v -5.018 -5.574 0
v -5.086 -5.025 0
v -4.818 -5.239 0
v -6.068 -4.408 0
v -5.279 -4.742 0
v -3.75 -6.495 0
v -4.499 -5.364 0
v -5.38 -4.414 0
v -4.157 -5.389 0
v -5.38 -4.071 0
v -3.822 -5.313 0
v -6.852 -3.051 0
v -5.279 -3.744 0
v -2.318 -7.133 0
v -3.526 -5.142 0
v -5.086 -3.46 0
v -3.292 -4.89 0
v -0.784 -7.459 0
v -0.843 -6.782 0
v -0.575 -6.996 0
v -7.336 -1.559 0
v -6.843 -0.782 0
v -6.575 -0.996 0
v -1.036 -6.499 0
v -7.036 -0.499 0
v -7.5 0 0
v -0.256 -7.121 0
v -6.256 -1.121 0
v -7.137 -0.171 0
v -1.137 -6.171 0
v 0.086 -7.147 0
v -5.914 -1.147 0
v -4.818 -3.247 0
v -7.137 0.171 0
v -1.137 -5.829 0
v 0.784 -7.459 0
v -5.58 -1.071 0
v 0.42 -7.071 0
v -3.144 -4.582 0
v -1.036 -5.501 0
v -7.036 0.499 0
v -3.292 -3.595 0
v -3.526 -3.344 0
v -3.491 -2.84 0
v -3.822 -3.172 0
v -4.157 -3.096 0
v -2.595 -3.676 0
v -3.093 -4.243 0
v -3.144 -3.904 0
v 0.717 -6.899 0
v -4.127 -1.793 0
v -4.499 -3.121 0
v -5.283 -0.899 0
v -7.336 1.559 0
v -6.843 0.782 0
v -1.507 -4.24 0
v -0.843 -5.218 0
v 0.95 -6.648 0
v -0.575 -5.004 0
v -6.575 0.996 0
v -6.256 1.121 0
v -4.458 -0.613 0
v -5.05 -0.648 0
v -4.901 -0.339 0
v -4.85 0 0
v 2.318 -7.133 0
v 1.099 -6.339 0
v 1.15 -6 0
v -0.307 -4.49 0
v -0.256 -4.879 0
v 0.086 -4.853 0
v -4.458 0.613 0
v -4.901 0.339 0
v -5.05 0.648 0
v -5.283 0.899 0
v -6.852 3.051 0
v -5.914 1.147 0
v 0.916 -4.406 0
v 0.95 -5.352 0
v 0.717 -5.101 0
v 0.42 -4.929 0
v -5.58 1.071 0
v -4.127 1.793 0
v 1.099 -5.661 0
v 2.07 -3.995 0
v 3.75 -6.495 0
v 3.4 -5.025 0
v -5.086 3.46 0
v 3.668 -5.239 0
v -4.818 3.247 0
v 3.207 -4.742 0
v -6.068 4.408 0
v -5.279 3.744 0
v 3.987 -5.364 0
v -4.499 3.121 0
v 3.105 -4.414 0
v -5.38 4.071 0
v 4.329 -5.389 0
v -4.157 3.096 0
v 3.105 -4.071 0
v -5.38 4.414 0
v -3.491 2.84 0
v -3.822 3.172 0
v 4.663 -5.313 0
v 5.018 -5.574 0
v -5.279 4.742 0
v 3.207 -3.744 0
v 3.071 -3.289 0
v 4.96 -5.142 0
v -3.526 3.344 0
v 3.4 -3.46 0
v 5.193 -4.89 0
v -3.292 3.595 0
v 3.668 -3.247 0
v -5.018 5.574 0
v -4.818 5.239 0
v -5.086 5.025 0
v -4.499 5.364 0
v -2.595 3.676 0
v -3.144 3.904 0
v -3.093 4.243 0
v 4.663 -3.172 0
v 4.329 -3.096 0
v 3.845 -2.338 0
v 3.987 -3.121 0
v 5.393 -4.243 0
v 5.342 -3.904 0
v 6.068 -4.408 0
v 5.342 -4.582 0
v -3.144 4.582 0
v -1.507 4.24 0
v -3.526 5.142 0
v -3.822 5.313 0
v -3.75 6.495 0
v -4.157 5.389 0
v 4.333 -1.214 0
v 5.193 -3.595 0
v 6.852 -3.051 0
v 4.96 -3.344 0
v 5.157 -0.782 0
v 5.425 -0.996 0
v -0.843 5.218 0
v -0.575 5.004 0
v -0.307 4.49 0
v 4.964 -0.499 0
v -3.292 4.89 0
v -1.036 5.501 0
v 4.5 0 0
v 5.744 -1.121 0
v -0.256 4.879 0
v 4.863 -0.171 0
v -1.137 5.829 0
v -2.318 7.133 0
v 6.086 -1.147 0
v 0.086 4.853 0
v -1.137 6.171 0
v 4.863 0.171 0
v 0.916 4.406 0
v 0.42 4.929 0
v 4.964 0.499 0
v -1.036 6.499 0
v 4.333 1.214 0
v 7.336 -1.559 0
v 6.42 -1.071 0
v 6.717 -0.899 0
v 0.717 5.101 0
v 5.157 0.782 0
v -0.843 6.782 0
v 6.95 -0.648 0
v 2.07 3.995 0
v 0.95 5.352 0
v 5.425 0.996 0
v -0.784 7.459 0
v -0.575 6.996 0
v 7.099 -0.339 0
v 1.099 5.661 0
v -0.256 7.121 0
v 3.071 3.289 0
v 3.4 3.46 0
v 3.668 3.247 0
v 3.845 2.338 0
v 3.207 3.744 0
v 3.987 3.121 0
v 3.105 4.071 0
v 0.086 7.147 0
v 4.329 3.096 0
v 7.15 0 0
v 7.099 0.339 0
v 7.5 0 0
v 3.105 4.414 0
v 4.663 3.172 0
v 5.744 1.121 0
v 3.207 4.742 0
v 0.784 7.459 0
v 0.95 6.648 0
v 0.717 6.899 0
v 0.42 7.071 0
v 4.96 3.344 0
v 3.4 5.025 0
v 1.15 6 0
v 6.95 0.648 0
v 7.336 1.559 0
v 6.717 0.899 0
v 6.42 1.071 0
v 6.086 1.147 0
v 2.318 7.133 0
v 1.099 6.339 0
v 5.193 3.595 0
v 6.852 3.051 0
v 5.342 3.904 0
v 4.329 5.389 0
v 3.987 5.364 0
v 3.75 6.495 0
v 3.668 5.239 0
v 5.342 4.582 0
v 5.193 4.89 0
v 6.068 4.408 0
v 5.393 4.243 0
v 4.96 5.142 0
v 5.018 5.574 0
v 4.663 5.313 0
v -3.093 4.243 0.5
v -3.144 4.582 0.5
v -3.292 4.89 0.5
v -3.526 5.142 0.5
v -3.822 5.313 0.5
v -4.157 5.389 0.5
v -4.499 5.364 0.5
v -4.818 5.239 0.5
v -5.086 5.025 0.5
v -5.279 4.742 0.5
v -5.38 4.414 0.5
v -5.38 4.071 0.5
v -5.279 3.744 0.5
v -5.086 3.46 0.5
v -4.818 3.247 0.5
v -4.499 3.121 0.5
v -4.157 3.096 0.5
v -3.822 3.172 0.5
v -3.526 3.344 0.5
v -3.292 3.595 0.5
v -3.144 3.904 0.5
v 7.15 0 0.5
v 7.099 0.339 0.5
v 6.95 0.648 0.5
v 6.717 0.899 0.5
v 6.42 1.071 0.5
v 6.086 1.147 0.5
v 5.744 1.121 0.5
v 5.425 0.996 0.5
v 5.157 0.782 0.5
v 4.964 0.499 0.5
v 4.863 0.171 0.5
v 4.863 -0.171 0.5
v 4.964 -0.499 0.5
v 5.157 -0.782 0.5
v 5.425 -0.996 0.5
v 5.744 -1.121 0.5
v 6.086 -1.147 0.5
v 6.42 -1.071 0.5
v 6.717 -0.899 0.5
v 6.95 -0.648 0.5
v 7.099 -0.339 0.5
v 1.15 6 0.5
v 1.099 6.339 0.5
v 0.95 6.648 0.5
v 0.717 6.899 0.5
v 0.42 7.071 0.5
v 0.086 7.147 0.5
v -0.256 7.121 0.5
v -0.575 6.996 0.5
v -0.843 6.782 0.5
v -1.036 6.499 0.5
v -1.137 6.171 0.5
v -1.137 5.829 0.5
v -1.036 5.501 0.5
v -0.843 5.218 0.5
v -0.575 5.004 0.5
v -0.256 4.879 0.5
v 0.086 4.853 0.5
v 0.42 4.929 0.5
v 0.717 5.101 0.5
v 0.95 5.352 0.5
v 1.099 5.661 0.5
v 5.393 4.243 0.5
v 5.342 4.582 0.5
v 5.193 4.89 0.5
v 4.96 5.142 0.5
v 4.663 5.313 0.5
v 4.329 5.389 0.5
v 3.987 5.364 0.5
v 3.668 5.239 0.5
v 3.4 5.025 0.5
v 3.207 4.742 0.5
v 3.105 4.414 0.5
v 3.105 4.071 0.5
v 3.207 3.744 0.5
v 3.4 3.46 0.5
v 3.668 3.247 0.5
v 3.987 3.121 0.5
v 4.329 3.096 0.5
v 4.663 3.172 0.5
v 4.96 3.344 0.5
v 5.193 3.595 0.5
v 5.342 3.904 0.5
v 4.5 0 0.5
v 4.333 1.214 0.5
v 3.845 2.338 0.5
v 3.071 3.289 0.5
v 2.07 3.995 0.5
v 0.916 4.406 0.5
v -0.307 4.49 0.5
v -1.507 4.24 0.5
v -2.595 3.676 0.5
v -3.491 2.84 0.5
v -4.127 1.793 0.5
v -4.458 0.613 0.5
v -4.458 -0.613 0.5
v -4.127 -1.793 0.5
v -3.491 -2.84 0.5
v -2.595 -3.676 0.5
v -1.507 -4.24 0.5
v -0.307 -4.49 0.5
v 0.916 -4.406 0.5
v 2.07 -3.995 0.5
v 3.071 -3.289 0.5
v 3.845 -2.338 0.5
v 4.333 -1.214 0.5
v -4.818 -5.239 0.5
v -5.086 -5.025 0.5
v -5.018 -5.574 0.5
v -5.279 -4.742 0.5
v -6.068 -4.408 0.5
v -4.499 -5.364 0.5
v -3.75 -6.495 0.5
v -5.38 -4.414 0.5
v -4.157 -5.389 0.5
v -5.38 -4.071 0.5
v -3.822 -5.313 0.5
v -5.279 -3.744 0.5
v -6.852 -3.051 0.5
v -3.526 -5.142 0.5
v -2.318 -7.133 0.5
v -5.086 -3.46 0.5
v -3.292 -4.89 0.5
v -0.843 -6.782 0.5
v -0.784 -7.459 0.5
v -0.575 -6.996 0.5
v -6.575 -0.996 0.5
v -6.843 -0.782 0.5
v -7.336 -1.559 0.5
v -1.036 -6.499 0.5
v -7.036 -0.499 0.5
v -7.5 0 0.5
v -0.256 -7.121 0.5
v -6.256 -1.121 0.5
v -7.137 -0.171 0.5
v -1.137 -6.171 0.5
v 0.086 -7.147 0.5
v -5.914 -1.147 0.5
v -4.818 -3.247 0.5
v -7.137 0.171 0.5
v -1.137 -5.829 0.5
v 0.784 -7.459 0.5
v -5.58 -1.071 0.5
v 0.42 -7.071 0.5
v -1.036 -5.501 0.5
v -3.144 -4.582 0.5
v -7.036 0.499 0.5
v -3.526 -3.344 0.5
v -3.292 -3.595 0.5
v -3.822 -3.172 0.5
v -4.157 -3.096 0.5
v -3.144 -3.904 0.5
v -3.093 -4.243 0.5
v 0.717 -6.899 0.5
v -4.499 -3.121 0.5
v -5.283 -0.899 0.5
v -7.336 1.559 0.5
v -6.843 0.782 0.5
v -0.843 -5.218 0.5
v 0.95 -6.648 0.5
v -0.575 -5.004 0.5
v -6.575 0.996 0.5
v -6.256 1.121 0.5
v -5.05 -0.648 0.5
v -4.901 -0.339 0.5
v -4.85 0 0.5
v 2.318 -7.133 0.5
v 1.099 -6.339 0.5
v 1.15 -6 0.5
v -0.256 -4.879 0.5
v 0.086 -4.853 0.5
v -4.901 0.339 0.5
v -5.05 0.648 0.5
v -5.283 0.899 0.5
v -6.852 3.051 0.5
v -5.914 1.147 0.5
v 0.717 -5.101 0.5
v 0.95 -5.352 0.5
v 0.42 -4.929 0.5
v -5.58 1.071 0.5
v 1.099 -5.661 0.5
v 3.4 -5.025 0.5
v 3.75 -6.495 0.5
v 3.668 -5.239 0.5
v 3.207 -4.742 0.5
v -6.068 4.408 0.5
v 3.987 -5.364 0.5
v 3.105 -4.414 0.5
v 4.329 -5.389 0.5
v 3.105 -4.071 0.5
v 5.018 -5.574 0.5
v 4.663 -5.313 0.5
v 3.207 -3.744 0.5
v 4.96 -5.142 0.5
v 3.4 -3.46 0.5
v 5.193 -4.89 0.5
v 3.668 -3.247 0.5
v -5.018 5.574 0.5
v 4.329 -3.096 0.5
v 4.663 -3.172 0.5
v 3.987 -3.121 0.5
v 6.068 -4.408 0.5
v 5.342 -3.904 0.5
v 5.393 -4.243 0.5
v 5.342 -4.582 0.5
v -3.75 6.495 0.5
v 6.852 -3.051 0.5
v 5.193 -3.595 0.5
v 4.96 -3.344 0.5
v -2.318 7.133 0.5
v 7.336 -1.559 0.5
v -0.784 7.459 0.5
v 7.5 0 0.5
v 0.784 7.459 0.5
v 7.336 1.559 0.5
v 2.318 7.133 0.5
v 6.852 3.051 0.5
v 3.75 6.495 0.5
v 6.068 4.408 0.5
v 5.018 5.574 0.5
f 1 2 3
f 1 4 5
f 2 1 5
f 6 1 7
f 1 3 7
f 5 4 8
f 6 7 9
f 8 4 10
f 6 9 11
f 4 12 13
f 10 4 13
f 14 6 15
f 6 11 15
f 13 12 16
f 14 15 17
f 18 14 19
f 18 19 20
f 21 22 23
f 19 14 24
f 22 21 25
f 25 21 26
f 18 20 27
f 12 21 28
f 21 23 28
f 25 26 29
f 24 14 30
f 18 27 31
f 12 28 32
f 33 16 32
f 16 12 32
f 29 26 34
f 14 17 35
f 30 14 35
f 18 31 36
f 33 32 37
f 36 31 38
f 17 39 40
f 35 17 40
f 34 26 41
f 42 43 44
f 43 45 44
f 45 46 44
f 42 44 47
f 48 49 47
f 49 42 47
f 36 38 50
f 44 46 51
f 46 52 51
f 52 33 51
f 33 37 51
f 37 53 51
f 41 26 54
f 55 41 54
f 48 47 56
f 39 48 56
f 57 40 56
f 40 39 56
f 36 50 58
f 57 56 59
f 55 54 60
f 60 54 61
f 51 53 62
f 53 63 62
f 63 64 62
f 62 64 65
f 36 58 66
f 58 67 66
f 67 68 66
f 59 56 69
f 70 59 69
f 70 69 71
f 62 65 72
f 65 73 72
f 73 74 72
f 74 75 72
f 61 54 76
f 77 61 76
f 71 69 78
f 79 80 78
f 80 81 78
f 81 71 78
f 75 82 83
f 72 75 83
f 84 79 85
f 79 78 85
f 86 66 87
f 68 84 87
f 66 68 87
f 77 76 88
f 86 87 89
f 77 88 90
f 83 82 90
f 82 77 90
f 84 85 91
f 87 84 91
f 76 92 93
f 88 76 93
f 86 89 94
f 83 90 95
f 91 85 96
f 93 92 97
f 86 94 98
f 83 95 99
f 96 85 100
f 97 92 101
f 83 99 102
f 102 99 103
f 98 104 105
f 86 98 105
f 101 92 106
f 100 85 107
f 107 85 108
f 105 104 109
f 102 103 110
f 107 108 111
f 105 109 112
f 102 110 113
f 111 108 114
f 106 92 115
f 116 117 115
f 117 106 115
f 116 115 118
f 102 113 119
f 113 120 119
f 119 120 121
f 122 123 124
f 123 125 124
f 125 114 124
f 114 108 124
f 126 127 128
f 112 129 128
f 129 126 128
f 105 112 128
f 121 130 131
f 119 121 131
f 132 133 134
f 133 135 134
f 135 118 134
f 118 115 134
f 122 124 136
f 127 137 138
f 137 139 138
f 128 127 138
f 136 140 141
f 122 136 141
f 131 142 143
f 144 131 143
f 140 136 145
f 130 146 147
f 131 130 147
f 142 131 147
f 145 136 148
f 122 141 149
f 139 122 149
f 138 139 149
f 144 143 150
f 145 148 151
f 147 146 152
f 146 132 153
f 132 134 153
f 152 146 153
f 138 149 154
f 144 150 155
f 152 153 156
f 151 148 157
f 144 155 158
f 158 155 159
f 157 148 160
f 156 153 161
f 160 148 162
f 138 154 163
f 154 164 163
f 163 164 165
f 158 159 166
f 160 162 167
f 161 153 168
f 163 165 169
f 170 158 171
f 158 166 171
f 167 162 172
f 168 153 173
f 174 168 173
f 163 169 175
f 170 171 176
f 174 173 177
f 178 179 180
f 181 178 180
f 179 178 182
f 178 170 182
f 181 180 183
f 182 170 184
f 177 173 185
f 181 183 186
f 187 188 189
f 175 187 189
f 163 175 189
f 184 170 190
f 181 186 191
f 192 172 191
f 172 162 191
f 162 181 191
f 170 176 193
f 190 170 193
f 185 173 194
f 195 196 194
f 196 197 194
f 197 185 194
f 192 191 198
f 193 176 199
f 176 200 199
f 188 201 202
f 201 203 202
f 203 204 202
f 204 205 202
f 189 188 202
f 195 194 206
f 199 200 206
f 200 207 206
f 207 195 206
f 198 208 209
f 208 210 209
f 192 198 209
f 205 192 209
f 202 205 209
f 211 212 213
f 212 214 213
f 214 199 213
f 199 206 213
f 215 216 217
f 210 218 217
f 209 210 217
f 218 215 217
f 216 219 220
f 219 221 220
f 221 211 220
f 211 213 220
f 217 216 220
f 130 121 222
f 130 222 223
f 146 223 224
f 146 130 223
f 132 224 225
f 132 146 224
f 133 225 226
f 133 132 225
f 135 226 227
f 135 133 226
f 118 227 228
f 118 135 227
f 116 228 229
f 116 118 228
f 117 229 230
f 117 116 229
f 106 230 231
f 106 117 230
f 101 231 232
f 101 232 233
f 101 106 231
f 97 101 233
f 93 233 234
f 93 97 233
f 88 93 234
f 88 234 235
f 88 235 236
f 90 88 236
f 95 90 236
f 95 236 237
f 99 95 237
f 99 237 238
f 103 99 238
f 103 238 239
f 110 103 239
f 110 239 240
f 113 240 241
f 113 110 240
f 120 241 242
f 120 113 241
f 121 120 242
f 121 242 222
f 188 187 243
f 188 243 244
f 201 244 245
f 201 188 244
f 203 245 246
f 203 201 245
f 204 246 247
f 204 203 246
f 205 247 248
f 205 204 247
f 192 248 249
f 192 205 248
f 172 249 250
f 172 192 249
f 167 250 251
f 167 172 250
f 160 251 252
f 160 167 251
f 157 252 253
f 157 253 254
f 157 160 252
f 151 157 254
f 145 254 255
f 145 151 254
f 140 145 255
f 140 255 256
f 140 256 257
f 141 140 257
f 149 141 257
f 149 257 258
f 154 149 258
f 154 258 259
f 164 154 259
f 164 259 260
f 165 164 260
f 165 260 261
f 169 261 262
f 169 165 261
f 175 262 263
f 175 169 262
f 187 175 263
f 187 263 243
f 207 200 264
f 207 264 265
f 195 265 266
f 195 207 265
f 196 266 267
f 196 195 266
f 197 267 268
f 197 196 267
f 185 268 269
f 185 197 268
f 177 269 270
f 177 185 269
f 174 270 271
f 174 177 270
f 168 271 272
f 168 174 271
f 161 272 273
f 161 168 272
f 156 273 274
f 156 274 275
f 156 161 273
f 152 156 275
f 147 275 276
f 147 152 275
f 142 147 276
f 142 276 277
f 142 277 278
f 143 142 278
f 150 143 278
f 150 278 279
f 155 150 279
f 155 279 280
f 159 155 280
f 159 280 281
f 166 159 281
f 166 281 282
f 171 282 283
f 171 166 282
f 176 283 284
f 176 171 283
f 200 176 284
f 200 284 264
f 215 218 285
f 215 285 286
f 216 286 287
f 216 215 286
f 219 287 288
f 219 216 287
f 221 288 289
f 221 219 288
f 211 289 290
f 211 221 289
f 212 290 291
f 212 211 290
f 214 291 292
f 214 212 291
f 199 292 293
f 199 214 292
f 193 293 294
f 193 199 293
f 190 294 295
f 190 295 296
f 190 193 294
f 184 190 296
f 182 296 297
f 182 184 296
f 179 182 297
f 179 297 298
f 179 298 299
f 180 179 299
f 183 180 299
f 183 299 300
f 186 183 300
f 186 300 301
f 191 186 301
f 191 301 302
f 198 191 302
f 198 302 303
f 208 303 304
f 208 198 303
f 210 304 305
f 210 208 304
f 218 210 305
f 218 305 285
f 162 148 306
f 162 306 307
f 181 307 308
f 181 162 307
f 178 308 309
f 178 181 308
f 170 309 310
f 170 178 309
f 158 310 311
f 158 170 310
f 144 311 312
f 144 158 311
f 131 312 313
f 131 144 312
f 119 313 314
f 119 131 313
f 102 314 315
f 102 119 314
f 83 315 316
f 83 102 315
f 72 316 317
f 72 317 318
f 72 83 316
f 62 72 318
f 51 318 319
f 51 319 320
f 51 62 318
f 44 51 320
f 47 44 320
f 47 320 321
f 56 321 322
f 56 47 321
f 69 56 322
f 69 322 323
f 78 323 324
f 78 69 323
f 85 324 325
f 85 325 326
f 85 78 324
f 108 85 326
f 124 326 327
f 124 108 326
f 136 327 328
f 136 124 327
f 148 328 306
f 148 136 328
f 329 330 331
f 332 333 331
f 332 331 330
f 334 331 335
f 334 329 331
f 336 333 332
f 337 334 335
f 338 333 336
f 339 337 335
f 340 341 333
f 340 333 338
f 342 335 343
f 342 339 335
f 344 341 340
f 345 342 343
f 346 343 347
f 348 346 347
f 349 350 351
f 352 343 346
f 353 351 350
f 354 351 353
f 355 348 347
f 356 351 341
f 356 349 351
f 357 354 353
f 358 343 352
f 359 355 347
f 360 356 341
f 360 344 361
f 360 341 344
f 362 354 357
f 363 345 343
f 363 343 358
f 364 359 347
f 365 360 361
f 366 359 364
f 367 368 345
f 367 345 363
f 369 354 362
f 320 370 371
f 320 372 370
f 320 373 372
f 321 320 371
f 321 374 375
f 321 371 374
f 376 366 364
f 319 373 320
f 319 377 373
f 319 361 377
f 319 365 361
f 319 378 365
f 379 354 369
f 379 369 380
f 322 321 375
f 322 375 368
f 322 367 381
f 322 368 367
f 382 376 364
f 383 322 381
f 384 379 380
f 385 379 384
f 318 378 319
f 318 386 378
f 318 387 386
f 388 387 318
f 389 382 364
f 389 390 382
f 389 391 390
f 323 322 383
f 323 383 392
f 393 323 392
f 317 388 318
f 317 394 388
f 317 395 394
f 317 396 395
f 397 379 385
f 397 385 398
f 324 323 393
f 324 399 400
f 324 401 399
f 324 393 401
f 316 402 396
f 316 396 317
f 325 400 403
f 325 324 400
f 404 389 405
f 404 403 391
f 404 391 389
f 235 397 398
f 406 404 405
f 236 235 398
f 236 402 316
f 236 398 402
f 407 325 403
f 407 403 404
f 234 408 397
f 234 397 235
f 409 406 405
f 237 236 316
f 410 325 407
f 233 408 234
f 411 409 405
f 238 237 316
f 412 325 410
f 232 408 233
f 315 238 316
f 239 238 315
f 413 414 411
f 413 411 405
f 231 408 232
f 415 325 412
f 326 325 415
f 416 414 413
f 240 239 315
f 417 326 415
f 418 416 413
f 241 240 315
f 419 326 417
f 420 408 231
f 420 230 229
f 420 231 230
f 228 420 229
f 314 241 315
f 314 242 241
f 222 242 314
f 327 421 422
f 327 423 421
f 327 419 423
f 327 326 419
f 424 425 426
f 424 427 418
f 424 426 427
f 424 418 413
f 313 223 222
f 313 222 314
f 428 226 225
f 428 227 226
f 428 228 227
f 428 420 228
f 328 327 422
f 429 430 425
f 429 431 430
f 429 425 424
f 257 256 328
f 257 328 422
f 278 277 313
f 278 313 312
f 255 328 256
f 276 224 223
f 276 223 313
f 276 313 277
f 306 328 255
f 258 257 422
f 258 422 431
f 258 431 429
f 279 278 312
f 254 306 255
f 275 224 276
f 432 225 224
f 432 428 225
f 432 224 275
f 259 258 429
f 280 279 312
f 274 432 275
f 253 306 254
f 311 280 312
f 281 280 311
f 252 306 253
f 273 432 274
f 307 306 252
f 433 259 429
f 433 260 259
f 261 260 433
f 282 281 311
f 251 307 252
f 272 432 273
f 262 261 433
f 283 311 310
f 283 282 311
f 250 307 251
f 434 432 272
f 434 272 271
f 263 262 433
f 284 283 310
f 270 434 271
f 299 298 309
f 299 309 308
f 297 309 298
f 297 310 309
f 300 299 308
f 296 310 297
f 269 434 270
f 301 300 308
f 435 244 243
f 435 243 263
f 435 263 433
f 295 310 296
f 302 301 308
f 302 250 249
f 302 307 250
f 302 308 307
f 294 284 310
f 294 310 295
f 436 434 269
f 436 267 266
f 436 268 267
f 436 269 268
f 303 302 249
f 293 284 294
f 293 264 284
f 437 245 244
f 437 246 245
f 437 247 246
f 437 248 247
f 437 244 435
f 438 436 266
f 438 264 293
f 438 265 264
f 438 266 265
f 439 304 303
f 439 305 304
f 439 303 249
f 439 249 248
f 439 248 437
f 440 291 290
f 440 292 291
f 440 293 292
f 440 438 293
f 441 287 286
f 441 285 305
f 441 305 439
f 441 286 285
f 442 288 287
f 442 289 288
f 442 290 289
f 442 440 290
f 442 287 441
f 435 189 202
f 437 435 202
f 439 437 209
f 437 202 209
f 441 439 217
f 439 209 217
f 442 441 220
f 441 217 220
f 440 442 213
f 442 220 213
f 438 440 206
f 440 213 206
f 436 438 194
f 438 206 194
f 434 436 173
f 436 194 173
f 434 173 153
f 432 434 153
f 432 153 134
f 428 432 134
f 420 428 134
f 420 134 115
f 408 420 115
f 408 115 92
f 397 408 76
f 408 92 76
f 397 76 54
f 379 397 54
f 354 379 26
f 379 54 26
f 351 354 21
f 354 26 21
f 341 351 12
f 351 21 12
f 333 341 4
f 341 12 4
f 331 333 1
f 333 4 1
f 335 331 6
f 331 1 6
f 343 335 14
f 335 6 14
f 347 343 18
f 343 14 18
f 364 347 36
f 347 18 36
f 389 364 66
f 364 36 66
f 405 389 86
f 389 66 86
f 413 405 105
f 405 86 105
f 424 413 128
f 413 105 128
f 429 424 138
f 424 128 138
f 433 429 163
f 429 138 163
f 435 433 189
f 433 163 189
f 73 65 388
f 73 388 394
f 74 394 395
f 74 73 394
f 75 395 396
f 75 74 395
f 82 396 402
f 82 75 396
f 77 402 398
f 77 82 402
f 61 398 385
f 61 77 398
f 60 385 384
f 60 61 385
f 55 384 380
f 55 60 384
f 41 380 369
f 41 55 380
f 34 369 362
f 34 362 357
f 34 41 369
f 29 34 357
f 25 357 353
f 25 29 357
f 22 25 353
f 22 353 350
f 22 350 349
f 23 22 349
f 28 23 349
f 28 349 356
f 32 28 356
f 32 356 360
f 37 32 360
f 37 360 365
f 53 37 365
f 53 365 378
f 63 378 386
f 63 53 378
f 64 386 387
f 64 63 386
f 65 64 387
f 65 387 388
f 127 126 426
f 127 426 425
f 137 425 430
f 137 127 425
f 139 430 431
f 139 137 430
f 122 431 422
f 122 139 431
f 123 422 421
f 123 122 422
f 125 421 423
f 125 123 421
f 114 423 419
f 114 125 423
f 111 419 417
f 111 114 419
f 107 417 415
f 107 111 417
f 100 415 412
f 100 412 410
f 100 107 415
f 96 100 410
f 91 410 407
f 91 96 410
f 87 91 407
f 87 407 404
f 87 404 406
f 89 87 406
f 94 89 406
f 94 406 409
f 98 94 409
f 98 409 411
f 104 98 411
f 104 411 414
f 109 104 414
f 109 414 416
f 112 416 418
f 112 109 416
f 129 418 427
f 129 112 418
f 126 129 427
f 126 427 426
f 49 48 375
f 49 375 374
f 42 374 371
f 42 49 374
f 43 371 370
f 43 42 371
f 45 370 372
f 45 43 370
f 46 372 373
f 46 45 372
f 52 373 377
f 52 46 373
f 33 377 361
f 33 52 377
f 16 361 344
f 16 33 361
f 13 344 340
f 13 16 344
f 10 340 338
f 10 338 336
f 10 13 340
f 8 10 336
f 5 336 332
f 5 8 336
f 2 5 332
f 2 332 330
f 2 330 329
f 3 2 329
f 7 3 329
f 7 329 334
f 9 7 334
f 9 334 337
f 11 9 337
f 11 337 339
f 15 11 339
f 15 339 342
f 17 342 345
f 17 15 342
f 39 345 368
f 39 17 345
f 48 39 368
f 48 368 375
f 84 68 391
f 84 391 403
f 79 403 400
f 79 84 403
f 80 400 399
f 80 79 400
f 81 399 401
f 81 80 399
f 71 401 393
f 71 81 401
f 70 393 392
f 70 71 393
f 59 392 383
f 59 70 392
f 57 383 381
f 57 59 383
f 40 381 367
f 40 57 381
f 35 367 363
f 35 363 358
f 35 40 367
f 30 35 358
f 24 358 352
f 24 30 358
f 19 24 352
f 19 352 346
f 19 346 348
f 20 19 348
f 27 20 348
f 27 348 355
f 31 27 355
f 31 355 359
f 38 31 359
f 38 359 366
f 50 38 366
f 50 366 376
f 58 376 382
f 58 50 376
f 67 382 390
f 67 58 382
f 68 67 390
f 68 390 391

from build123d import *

# Parameters (mm, degrees)
SKETCH_1_R      = 7.5
SKETCH_1_R_2    = 1.15
SKETCH_1_R_3    = 4.5
EXTRUDE_1_DEPTH = 0.5


with BuildPart() as part:
    # 草图1 → 凸台-拉伸1 (new body)
    with BuildSketch(Plane.XY):
        Circle(SKETCH_1_R)
        with Locations((0, 6)):
            Circle(SKETCH_1_R_2, mode=Mode.SUBTRACT)
        Circle(SKETCH_1_R_3, mode=Mode.SUBTRACT)
        with Locations((4.242640687, 4.242640687)):
            Circle(SKETCH_1_R_2, mode=Mode.SUBTRACT)
        with Locations((6, 0)):
            Circle(SKETCH_1_R_2, mode=Mode.SUBTRACT)
        with Locations((4.242640687, -4.242640687)):
            Circle(SKETCH_1_R_2, mode=Mode.SUBTRACT)
        with Locations((0, -6)):
            Circle(SKETCH_1_R_2, mode=Mode.SUBTRACT)
        with Locations((-4.242640687, -4.242640687)):
            Circle(SKETCH_1_R_2, mode=Mode.SUBTRACT)
        with Locations((-6, 0)):
            Circle(SKETCH_1_R_2, mode=Mode.SUBTRACT)
        with Locations((-4.242640687, 4.242640687)):
            Circle(SKETCH_1_R_2, mode=Mode.SUBTRACT)
    extrude(amount=EXTRUDE_1_DEPTH)


solid = part.part
